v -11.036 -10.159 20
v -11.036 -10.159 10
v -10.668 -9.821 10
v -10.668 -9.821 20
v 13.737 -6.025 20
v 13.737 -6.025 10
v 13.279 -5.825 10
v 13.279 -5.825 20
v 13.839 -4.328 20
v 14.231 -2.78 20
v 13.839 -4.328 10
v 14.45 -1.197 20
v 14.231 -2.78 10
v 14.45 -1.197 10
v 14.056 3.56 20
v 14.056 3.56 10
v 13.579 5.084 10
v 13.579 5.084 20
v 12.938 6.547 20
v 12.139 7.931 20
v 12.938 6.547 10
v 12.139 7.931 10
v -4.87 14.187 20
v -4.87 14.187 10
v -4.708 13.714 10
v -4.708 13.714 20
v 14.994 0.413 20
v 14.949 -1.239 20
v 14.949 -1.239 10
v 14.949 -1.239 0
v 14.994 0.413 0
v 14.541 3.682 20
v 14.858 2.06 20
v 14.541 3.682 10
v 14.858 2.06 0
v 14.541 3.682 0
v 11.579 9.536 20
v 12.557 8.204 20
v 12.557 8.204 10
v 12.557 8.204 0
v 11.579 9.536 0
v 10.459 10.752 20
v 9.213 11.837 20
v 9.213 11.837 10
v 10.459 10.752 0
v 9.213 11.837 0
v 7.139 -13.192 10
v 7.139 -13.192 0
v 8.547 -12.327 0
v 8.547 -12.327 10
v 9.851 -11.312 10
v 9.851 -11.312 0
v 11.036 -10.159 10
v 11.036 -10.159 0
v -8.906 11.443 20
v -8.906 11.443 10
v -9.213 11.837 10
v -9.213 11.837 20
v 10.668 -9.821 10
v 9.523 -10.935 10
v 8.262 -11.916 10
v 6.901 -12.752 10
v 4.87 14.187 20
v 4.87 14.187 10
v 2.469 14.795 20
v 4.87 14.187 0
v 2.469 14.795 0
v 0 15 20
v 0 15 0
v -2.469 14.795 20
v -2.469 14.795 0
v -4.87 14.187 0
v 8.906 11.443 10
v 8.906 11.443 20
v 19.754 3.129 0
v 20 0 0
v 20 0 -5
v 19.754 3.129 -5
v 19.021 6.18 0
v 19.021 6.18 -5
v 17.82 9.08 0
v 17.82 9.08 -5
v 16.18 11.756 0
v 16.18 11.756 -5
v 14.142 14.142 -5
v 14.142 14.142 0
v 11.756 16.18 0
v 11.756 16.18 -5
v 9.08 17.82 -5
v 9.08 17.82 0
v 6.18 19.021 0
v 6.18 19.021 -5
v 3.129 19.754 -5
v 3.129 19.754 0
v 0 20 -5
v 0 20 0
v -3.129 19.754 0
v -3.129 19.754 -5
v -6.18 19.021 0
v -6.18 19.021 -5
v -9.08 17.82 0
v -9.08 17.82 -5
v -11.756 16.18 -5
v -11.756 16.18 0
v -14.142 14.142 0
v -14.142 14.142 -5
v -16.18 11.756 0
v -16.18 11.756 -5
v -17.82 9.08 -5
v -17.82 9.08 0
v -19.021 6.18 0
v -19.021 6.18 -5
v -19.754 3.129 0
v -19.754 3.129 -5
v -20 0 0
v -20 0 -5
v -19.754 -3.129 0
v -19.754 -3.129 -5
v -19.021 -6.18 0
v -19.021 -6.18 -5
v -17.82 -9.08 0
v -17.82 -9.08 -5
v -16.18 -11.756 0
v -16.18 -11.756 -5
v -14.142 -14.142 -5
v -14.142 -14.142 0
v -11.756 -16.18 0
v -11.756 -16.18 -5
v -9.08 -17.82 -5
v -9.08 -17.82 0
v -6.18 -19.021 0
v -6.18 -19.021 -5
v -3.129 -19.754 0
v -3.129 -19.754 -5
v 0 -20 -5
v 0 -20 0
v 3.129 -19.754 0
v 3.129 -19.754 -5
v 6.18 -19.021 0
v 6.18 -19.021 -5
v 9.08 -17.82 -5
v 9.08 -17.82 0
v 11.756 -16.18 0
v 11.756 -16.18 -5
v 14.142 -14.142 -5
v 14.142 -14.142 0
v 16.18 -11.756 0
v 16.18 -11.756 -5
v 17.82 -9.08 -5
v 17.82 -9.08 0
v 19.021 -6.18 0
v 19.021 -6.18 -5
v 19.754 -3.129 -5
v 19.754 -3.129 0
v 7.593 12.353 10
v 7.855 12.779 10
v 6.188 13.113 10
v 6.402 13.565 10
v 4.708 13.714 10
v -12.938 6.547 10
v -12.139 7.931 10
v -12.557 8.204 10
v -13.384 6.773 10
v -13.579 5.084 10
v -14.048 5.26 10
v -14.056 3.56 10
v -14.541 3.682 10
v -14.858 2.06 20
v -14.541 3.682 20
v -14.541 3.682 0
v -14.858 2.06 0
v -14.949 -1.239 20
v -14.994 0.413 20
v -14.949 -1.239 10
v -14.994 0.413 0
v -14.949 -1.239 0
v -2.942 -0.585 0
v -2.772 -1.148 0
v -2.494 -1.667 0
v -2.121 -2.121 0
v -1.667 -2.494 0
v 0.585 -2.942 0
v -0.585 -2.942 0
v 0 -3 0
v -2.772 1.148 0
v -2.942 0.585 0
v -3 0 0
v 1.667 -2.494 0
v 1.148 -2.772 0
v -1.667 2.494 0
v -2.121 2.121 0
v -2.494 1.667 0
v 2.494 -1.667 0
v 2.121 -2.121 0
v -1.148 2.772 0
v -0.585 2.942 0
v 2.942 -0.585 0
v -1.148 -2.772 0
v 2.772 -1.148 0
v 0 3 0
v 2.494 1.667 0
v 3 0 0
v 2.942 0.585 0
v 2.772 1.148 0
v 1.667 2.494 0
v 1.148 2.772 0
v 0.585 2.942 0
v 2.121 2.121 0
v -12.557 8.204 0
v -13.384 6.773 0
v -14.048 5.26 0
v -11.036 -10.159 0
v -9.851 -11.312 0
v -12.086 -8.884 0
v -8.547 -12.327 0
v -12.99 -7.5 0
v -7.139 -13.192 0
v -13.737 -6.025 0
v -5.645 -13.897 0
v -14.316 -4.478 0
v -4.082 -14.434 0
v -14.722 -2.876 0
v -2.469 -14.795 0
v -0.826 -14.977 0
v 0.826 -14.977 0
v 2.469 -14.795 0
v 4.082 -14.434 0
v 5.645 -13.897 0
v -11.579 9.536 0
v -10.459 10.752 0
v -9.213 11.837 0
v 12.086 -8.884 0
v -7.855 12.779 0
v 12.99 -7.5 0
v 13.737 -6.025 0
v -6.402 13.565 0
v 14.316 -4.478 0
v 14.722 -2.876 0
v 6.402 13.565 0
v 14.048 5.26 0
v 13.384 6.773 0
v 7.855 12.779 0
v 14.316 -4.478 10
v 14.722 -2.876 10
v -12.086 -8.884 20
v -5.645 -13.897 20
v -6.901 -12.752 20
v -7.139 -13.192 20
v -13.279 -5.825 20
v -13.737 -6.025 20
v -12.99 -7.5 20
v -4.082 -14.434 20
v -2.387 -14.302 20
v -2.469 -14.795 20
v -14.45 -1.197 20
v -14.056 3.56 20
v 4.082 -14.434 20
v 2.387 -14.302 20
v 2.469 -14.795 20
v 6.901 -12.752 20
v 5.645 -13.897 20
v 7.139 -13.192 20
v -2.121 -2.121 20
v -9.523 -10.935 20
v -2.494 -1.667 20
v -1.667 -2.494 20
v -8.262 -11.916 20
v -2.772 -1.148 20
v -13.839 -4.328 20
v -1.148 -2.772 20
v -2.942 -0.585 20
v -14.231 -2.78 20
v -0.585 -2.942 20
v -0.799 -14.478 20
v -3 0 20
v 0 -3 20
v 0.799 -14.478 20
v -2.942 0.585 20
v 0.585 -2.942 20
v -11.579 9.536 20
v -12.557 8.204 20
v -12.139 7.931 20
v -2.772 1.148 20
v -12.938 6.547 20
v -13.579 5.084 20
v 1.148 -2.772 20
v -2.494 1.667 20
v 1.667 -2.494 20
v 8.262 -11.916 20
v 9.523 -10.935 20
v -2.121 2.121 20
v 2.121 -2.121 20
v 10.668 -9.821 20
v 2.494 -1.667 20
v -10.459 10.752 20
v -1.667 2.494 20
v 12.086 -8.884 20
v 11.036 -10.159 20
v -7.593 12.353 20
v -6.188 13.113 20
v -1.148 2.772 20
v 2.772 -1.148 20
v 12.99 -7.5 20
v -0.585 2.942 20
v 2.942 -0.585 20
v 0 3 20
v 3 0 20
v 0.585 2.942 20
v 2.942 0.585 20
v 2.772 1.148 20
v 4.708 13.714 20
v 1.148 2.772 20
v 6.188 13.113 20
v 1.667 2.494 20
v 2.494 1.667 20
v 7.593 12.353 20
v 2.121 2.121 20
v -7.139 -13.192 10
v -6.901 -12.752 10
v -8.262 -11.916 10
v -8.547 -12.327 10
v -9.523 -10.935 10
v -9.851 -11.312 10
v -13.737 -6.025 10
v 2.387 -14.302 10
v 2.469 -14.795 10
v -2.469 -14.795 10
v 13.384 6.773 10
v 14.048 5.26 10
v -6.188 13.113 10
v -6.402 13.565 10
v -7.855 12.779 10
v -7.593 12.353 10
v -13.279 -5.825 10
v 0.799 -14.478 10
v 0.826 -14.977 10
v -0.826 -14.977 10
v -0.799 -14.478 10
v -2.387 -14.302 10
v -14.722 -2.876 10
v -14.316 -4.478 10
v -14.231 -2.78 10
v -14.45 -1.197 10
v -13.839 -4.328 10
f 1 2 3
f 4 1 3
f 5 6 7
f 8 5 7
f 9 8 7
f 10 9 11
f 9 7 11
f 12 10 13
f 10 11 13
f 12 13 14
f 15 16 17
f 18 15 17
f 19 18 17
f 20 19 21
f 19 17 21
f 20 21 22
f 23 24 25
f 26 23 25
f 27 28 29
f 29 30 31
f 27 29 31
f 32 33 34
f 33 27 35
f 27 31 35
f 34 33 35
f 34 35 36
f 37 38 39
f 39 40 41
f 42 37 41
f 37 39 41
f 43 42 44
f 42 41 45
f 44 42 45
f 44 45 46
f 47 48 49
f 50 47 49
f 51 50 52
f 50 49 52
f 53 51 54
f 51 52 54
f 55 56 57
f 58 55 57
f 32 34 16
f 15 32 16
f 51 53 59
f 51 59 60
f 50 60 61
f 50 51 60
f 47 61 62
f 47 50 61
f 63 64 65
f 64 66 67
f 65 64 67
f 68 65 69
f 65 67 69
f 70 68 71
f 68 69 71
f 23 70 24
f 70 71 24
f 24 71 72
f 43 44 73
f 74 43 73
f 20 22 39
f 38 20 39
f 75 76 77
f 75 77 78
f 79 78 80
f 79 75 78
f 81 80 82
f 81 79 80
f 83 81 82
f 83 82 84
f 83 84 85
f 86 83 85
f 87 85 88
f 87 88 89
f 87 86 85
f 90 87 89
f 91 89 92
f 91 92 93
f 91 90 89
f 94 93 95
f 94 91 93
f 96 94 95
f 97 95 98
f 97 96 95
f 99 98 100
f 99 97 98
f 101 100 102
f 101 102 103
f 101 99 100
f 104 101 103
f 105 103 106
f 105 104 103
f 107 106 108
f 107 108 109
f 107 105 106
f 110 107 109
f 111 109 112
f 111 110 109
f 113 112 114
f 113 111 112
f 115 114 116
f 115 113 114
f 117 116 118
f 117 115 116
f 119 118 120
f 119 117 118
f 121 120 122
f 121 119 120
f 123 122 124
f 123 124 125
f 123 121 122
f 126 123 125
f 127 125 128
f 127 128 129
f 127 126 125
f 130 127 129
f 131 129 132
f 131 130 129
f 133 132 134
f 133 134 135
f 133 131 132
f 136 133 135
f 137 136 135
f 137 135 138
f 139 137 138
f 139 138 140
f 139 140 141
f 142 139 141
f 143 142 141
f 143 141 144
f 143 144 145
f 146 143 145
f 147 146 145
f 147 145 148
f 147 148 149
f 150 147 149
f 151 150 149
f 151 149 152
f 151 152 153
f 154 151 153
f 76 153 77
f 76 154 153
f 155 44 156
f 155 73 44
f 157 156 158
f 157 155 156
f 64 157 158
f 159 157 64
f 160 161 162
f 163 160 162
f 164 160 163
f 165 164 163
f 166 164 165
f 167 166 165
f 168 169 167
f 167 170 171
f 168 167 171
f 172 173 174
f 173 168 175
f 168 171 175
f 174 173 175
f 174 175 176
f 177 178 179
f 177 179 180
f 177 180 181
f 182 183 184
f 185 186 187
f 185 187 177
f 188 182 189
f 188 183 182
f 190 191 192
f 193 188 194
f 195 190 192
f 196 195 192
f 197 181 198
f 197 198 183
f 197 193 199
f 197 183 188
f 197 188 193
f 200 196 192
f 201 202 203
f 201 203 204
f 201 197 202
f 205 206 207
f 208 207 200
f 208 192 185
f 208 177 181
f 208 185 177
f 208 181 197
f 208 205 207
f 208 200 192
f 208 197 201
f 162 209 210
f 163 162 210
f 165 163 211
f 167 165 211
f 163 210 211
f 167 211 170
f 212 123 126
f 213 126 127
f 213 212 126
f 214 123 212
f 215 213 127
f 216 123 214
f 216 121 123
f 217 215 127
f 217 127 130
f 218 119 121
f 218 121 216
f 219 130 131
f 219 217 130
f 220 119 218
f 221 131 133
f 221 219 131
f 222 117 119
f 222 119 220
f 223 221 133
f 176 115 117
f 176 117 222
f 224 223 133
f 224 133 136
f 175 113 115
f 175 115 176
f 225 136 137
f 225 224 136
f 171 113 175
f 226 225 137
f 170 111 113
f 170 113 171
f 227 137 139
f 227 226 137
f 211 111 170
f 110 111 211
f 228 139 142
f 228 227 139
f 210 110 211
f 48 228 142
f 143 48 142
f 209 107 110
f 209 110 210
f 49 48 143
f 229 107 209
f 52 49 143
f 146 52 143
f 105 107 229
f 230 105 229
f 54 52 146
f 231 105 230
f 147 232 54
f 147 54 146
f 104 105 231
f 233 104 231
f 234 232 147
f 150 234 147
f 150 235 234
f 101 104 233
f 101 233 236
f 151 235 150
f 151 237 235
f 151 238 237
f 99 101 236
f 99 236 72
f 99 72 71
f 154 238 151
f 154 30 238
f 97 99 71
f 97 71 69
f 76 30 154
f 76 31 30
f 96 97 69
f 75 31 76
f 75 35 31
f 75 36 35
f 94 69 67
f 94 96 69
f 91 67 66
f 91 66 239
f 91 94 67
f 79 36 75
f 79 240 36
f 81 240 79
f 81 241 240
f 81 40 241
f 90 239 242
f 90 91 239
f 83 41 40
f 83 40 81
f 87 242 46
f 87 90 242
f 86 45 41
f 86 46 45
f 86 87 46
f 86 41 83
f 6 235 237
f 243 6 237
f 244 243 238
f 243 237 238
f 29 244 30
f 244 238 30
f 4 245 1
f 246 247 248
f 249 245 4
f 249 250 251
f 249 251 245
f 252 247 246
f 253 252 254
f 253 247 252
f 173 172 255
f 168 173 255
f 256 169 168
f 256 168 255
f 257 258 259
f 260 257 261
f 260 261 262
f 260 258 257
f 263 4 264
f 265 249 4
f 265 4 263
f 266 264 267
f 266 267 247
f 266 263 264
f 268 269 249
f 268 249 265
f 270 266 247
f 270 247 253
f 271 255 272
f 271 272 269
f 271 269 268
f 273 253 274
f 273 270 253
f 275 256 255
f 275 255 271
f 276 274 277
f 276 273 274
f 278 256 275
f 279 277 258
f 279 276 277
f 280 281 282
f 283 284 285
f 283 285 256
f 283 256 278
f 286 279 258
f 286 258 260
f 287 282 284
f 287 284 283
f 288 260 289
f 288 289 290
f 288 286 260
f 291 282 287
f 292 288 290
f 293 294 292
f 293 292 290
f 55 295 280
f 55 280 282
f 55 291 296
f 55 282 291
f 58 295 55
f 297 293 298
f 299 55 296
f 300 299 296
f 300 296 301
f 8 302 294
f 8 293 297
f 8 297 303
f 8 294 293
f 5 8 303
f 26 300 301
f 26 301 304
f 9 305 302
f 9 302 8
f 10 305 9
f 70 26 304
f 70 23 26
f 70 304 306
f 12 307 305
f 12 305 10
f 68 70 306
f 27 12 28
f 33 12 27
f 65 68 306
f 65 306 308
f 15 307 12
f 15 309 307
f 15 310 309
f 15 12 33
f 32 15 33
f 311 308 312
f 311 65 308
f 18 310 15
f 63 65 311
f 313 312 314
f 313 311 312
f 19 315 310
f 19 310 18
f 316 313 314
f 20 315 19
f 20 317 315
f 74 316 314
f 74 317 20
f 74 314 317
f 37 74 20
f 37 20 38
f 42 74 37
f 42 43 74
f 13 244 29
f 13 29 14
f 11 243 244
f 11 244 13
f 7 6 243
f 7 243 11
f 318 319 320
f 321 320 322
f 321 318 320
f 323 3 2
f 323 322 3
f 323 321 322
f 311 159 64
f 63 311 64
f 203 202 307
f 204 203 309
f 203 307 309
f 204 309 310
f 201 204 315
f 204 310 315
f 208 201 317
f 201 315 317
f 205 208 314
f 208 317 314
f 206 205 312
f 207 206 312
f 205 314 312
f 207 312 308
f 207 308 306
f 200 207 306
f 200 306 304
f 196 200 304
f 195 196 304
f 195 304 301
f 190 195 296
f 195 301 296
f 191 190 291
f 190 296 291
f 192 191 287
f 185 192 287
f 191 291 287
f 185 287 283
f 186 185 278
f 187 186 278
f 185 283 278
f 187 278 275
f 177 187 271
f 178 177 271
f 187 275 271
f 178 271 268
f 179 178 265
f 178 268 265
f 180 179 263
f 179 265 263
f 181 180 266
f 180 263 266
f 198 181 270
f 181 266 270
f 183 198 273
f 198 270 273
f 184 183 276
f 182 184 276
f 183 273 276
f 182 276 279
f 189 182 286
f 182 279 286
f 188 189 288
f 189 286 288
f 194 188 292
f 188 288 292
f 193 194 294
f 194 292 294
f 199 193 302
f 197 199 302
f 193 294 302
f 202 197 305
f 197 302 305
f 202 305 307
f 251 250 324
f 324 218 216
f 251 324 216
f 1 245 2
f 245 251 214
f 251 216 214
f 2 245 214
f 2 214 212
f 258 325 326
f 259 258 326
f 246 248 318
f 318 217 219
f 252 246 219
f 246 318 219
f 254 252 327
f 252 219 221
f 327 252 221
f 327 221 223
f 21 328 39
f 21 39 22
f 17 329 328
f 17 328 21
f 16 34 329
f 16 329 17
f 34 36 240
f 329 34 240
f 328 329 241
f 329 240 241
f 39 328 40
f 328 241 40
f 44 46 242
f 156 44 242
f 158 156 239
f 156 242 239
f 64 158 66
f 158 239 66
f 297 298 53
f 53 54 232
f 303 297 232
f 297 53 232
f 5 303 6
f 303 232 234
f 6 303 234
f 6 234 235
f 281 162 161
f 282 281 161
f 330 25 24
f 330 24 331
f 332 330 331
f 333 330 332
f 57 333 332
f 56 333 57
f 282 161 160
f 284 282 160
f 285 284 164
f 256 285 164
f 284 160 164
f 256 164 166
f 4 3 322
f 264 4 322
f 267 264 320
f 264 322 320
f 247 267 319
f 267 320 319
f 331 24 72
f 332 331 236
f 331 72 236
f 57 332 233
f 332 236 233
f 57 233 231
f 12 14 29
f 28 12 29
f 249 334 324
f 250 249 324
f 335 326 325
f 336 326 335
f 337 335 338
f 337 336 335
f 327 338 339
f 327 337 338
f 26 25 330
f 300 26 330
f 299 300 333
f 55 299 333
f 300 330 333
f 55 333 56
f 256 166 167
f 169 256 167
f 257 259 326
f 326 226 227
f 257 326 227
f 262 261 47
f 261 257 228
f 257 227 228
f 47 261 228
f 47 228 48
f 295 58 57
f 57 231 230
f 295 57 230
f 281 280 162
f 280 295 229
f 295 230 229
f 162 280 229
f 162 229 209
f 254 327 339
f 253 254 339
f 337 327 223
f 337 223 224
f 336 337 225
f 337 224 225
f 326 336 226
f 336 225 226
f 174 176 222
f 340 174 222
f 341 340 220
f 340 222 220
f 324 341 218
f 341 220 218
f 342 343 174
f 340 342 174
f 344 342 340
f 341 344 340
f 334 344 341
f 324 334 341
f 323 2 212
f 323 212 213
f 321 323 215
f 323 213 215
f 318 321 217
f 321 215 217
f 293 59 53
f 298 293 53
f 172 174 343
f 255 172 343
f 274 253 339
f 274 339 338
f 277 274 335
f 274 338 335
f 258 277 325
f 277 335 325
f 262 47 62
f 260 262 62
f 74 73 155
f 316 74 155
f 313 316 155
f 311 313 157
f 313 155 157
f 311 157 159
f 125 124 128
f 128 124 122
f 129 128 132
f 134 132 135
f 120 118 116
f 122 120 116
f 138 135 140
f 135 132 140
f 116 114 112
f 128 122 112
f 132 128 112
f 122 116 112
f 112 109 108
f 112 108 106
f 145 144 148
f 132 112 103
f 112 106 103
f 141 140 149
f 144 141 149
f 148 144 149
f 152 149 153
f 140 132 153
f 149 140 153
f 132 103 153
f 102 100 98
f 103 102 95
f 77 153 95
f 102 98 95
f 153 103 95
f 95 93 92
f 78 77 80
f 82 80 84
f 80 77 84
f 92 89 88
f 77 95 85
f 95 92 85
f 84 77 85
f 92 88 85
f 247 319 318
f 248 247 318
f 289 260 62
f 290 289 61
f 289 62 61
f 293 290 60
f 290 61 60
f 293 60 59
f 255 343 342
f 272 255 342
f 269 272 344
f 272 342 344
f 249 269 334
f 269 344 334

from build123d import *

# Parameters (mm, degrees)
BOSS_EXTRUDE1_DEPTH = 20
SKETCH1_7_R         = 20
BOSS_EXTRUDE5_DEPTH = 5
SKETCH4_R           = 15
SKETCH4_R_2         = 14.5
BOSS_EXTRUDE6_DEPTH = 10
SKETCH5_R           = 3
CUT_EXTRUDE1_DEPTH  = 20


with BuildPart() as part:
    # Sketch1 → Boss-Extrude1 (new body)
    with BuildSketch(Plane.XY):
        with BuildLine():
            ThreePointArc((-4.708142303, 13.714350005), (-6.901237199, 12.752369392), (-8.906084334, 11.442537386))
            Line((-8.906084334, 11.442537386), (-9.21319069, 11.837107641))
            ThreePointArc((-9.21319069, 11.837107641), (-11.03585866, 10.159223574), (-12.557497174, 8.204222372))
            Line((-12.557497174, 8.204222372), (-12.138913935, 7.930748293))
            ThreePointArc((-12.138913935, 7.930748293), (-13.278713236, 5.824583657), (-14.056303856, 3.559539564))
            Line((-14.056303856, 3.559539564), (-14.541003989, 3.682282307))
            ThreePointArc((-14.541003989, 3.682282307), (-14.948767395, 1.238690182), (-14.948767395, -1.238690182))
            Line((-14.948767395, -1.238690182), (-14.450475149, -1.197400509))
            ThreePointArc((-14.450475149, -1.197400509), (-14.056303856, -3.559539564), (-13.278713236, -5.824583657))
            Line((-13.278713236, -5.824583657), (-13.7365999, -6.02543137))
            ThreePointArc((-13.7365999, -6.02543137), (-12.557497174, -8.204222372), (-11.03585866, -10.159223574))
            Line((-11.03585866, -10.159223574), (-10.667996705, -9.820582789))
            ThreePointArc((-10.667996705, -9.820582789), (-8.906084334, -11.442537386), (-6.901237199, -12.752369392))
            Line((-6.901237199, -12.752369392), (-7.139210896, -13.192106268))
            ThreePointArc((-7.139210896, -13.192106268), (-4.870492038, -14.187258626), (-2.468918854, -14.795419551))
            Line((-2.468918854, -14.795419551), (-2.386621559, -14.302238899))
            ThreePointArc((-2.386621559, -14.302238899), (0, -14.5), (2.386621559, -14.302238899))
            Line((2.386621559, -14.302238899), (2.468918854, -14.795419551))
            ThreePointArc((2.468918854, -14.795419551), (4.870492038, -14.187258626), (7.139210896, -13.192106268))
            Line((7.139210896, -13.192106268), (6.901237199, -12.752369392))
            ThreePointArc((6.901237199, -12.752369392), (8.906084334, -11.442537386), (10.667996705, -9.820582789))
            Line((10.667996705, -9.820582789), (11.03585866, -10.159223574))
            ThreePointArc((11.03585866, -10.159223574), (12.557497174, -8.204222372), (13.7365999, -6.02543137))
            Line((13.7365999, -6.02543137), (13.278713236, -5.824583657))
            ThreePointArc((13.278713236, -5.824583657), (14.056303856, -3.559539564), (14.450475149, -1.197400509))
            Line((14.450475149, -1.197400509), (14.948767395, -1.238690182))
            ThreePointArc((14.948767395, -1.238690182), (14.948767395, 1.238690182), (14.541003989, 3.682282307))
            Line((14.541003989, 3.682282307), (14.056303856, 3.559539564))
            ThreePointArc((14.056303856, 3.559539564), (13.278713236, 5.824583657), (12.138913935, 7.930748293))
            Line((12.138913935, 7.930748293), (12.557497174, 8.204222372))
            ThreePointArc((12.557497174, 8.204222372), (11.03585866, 10.159223574), (9.21319069, 11.837107641))
            Line((9.21319069, 11.837107641), (8.906084334, 11.442537386))
            ThreePointArc((8.906084334, 11.442537386), (6.901237199, 12.752369392), (4.708142303, 13.714350005))
            Line((4.708142303, 13.714350005), (4.870492038, 14.187258626))
            ThreePointArc((4.870492038, 14.187258626), (0, 15), (-4.870492038, 14.187258626))
            Line((-4.870492038, 14.187258626), (-4.708142303, 13.714350005))
        make_face()
    extrude(amount=BOSS_EXTRUDE1_DEPTH)

    # Sketch1<7> → Boss-Extrude5 (add)
    with BuildSketch(Plane.XY):
        Circle(SKETCH1_7_R)
    extrude(amount=-BOSS_EXTRUDE5_DEPTH)

    # Sketch4 → Boss-Extrude6 (add)
    with BuildSketch(Plane.XY):
        Circle(SKETCH4_R)
        Circle(SKETCH4_R_2, mode=Mode.SUBTRACT)
    extrude(amount=BOSS_EXTRUDE6_DEPTH)

    # Sketch5 → Cut-Extrude1 (cut)
    with BuildSketch(Plane.XY.offset(20)):
        Circle(SKETCH5_R)
    extrude(amount=-CUT_EXTRUDE1_DEPTH, mode=Mode.SUBTRACT)


solid = part.part
